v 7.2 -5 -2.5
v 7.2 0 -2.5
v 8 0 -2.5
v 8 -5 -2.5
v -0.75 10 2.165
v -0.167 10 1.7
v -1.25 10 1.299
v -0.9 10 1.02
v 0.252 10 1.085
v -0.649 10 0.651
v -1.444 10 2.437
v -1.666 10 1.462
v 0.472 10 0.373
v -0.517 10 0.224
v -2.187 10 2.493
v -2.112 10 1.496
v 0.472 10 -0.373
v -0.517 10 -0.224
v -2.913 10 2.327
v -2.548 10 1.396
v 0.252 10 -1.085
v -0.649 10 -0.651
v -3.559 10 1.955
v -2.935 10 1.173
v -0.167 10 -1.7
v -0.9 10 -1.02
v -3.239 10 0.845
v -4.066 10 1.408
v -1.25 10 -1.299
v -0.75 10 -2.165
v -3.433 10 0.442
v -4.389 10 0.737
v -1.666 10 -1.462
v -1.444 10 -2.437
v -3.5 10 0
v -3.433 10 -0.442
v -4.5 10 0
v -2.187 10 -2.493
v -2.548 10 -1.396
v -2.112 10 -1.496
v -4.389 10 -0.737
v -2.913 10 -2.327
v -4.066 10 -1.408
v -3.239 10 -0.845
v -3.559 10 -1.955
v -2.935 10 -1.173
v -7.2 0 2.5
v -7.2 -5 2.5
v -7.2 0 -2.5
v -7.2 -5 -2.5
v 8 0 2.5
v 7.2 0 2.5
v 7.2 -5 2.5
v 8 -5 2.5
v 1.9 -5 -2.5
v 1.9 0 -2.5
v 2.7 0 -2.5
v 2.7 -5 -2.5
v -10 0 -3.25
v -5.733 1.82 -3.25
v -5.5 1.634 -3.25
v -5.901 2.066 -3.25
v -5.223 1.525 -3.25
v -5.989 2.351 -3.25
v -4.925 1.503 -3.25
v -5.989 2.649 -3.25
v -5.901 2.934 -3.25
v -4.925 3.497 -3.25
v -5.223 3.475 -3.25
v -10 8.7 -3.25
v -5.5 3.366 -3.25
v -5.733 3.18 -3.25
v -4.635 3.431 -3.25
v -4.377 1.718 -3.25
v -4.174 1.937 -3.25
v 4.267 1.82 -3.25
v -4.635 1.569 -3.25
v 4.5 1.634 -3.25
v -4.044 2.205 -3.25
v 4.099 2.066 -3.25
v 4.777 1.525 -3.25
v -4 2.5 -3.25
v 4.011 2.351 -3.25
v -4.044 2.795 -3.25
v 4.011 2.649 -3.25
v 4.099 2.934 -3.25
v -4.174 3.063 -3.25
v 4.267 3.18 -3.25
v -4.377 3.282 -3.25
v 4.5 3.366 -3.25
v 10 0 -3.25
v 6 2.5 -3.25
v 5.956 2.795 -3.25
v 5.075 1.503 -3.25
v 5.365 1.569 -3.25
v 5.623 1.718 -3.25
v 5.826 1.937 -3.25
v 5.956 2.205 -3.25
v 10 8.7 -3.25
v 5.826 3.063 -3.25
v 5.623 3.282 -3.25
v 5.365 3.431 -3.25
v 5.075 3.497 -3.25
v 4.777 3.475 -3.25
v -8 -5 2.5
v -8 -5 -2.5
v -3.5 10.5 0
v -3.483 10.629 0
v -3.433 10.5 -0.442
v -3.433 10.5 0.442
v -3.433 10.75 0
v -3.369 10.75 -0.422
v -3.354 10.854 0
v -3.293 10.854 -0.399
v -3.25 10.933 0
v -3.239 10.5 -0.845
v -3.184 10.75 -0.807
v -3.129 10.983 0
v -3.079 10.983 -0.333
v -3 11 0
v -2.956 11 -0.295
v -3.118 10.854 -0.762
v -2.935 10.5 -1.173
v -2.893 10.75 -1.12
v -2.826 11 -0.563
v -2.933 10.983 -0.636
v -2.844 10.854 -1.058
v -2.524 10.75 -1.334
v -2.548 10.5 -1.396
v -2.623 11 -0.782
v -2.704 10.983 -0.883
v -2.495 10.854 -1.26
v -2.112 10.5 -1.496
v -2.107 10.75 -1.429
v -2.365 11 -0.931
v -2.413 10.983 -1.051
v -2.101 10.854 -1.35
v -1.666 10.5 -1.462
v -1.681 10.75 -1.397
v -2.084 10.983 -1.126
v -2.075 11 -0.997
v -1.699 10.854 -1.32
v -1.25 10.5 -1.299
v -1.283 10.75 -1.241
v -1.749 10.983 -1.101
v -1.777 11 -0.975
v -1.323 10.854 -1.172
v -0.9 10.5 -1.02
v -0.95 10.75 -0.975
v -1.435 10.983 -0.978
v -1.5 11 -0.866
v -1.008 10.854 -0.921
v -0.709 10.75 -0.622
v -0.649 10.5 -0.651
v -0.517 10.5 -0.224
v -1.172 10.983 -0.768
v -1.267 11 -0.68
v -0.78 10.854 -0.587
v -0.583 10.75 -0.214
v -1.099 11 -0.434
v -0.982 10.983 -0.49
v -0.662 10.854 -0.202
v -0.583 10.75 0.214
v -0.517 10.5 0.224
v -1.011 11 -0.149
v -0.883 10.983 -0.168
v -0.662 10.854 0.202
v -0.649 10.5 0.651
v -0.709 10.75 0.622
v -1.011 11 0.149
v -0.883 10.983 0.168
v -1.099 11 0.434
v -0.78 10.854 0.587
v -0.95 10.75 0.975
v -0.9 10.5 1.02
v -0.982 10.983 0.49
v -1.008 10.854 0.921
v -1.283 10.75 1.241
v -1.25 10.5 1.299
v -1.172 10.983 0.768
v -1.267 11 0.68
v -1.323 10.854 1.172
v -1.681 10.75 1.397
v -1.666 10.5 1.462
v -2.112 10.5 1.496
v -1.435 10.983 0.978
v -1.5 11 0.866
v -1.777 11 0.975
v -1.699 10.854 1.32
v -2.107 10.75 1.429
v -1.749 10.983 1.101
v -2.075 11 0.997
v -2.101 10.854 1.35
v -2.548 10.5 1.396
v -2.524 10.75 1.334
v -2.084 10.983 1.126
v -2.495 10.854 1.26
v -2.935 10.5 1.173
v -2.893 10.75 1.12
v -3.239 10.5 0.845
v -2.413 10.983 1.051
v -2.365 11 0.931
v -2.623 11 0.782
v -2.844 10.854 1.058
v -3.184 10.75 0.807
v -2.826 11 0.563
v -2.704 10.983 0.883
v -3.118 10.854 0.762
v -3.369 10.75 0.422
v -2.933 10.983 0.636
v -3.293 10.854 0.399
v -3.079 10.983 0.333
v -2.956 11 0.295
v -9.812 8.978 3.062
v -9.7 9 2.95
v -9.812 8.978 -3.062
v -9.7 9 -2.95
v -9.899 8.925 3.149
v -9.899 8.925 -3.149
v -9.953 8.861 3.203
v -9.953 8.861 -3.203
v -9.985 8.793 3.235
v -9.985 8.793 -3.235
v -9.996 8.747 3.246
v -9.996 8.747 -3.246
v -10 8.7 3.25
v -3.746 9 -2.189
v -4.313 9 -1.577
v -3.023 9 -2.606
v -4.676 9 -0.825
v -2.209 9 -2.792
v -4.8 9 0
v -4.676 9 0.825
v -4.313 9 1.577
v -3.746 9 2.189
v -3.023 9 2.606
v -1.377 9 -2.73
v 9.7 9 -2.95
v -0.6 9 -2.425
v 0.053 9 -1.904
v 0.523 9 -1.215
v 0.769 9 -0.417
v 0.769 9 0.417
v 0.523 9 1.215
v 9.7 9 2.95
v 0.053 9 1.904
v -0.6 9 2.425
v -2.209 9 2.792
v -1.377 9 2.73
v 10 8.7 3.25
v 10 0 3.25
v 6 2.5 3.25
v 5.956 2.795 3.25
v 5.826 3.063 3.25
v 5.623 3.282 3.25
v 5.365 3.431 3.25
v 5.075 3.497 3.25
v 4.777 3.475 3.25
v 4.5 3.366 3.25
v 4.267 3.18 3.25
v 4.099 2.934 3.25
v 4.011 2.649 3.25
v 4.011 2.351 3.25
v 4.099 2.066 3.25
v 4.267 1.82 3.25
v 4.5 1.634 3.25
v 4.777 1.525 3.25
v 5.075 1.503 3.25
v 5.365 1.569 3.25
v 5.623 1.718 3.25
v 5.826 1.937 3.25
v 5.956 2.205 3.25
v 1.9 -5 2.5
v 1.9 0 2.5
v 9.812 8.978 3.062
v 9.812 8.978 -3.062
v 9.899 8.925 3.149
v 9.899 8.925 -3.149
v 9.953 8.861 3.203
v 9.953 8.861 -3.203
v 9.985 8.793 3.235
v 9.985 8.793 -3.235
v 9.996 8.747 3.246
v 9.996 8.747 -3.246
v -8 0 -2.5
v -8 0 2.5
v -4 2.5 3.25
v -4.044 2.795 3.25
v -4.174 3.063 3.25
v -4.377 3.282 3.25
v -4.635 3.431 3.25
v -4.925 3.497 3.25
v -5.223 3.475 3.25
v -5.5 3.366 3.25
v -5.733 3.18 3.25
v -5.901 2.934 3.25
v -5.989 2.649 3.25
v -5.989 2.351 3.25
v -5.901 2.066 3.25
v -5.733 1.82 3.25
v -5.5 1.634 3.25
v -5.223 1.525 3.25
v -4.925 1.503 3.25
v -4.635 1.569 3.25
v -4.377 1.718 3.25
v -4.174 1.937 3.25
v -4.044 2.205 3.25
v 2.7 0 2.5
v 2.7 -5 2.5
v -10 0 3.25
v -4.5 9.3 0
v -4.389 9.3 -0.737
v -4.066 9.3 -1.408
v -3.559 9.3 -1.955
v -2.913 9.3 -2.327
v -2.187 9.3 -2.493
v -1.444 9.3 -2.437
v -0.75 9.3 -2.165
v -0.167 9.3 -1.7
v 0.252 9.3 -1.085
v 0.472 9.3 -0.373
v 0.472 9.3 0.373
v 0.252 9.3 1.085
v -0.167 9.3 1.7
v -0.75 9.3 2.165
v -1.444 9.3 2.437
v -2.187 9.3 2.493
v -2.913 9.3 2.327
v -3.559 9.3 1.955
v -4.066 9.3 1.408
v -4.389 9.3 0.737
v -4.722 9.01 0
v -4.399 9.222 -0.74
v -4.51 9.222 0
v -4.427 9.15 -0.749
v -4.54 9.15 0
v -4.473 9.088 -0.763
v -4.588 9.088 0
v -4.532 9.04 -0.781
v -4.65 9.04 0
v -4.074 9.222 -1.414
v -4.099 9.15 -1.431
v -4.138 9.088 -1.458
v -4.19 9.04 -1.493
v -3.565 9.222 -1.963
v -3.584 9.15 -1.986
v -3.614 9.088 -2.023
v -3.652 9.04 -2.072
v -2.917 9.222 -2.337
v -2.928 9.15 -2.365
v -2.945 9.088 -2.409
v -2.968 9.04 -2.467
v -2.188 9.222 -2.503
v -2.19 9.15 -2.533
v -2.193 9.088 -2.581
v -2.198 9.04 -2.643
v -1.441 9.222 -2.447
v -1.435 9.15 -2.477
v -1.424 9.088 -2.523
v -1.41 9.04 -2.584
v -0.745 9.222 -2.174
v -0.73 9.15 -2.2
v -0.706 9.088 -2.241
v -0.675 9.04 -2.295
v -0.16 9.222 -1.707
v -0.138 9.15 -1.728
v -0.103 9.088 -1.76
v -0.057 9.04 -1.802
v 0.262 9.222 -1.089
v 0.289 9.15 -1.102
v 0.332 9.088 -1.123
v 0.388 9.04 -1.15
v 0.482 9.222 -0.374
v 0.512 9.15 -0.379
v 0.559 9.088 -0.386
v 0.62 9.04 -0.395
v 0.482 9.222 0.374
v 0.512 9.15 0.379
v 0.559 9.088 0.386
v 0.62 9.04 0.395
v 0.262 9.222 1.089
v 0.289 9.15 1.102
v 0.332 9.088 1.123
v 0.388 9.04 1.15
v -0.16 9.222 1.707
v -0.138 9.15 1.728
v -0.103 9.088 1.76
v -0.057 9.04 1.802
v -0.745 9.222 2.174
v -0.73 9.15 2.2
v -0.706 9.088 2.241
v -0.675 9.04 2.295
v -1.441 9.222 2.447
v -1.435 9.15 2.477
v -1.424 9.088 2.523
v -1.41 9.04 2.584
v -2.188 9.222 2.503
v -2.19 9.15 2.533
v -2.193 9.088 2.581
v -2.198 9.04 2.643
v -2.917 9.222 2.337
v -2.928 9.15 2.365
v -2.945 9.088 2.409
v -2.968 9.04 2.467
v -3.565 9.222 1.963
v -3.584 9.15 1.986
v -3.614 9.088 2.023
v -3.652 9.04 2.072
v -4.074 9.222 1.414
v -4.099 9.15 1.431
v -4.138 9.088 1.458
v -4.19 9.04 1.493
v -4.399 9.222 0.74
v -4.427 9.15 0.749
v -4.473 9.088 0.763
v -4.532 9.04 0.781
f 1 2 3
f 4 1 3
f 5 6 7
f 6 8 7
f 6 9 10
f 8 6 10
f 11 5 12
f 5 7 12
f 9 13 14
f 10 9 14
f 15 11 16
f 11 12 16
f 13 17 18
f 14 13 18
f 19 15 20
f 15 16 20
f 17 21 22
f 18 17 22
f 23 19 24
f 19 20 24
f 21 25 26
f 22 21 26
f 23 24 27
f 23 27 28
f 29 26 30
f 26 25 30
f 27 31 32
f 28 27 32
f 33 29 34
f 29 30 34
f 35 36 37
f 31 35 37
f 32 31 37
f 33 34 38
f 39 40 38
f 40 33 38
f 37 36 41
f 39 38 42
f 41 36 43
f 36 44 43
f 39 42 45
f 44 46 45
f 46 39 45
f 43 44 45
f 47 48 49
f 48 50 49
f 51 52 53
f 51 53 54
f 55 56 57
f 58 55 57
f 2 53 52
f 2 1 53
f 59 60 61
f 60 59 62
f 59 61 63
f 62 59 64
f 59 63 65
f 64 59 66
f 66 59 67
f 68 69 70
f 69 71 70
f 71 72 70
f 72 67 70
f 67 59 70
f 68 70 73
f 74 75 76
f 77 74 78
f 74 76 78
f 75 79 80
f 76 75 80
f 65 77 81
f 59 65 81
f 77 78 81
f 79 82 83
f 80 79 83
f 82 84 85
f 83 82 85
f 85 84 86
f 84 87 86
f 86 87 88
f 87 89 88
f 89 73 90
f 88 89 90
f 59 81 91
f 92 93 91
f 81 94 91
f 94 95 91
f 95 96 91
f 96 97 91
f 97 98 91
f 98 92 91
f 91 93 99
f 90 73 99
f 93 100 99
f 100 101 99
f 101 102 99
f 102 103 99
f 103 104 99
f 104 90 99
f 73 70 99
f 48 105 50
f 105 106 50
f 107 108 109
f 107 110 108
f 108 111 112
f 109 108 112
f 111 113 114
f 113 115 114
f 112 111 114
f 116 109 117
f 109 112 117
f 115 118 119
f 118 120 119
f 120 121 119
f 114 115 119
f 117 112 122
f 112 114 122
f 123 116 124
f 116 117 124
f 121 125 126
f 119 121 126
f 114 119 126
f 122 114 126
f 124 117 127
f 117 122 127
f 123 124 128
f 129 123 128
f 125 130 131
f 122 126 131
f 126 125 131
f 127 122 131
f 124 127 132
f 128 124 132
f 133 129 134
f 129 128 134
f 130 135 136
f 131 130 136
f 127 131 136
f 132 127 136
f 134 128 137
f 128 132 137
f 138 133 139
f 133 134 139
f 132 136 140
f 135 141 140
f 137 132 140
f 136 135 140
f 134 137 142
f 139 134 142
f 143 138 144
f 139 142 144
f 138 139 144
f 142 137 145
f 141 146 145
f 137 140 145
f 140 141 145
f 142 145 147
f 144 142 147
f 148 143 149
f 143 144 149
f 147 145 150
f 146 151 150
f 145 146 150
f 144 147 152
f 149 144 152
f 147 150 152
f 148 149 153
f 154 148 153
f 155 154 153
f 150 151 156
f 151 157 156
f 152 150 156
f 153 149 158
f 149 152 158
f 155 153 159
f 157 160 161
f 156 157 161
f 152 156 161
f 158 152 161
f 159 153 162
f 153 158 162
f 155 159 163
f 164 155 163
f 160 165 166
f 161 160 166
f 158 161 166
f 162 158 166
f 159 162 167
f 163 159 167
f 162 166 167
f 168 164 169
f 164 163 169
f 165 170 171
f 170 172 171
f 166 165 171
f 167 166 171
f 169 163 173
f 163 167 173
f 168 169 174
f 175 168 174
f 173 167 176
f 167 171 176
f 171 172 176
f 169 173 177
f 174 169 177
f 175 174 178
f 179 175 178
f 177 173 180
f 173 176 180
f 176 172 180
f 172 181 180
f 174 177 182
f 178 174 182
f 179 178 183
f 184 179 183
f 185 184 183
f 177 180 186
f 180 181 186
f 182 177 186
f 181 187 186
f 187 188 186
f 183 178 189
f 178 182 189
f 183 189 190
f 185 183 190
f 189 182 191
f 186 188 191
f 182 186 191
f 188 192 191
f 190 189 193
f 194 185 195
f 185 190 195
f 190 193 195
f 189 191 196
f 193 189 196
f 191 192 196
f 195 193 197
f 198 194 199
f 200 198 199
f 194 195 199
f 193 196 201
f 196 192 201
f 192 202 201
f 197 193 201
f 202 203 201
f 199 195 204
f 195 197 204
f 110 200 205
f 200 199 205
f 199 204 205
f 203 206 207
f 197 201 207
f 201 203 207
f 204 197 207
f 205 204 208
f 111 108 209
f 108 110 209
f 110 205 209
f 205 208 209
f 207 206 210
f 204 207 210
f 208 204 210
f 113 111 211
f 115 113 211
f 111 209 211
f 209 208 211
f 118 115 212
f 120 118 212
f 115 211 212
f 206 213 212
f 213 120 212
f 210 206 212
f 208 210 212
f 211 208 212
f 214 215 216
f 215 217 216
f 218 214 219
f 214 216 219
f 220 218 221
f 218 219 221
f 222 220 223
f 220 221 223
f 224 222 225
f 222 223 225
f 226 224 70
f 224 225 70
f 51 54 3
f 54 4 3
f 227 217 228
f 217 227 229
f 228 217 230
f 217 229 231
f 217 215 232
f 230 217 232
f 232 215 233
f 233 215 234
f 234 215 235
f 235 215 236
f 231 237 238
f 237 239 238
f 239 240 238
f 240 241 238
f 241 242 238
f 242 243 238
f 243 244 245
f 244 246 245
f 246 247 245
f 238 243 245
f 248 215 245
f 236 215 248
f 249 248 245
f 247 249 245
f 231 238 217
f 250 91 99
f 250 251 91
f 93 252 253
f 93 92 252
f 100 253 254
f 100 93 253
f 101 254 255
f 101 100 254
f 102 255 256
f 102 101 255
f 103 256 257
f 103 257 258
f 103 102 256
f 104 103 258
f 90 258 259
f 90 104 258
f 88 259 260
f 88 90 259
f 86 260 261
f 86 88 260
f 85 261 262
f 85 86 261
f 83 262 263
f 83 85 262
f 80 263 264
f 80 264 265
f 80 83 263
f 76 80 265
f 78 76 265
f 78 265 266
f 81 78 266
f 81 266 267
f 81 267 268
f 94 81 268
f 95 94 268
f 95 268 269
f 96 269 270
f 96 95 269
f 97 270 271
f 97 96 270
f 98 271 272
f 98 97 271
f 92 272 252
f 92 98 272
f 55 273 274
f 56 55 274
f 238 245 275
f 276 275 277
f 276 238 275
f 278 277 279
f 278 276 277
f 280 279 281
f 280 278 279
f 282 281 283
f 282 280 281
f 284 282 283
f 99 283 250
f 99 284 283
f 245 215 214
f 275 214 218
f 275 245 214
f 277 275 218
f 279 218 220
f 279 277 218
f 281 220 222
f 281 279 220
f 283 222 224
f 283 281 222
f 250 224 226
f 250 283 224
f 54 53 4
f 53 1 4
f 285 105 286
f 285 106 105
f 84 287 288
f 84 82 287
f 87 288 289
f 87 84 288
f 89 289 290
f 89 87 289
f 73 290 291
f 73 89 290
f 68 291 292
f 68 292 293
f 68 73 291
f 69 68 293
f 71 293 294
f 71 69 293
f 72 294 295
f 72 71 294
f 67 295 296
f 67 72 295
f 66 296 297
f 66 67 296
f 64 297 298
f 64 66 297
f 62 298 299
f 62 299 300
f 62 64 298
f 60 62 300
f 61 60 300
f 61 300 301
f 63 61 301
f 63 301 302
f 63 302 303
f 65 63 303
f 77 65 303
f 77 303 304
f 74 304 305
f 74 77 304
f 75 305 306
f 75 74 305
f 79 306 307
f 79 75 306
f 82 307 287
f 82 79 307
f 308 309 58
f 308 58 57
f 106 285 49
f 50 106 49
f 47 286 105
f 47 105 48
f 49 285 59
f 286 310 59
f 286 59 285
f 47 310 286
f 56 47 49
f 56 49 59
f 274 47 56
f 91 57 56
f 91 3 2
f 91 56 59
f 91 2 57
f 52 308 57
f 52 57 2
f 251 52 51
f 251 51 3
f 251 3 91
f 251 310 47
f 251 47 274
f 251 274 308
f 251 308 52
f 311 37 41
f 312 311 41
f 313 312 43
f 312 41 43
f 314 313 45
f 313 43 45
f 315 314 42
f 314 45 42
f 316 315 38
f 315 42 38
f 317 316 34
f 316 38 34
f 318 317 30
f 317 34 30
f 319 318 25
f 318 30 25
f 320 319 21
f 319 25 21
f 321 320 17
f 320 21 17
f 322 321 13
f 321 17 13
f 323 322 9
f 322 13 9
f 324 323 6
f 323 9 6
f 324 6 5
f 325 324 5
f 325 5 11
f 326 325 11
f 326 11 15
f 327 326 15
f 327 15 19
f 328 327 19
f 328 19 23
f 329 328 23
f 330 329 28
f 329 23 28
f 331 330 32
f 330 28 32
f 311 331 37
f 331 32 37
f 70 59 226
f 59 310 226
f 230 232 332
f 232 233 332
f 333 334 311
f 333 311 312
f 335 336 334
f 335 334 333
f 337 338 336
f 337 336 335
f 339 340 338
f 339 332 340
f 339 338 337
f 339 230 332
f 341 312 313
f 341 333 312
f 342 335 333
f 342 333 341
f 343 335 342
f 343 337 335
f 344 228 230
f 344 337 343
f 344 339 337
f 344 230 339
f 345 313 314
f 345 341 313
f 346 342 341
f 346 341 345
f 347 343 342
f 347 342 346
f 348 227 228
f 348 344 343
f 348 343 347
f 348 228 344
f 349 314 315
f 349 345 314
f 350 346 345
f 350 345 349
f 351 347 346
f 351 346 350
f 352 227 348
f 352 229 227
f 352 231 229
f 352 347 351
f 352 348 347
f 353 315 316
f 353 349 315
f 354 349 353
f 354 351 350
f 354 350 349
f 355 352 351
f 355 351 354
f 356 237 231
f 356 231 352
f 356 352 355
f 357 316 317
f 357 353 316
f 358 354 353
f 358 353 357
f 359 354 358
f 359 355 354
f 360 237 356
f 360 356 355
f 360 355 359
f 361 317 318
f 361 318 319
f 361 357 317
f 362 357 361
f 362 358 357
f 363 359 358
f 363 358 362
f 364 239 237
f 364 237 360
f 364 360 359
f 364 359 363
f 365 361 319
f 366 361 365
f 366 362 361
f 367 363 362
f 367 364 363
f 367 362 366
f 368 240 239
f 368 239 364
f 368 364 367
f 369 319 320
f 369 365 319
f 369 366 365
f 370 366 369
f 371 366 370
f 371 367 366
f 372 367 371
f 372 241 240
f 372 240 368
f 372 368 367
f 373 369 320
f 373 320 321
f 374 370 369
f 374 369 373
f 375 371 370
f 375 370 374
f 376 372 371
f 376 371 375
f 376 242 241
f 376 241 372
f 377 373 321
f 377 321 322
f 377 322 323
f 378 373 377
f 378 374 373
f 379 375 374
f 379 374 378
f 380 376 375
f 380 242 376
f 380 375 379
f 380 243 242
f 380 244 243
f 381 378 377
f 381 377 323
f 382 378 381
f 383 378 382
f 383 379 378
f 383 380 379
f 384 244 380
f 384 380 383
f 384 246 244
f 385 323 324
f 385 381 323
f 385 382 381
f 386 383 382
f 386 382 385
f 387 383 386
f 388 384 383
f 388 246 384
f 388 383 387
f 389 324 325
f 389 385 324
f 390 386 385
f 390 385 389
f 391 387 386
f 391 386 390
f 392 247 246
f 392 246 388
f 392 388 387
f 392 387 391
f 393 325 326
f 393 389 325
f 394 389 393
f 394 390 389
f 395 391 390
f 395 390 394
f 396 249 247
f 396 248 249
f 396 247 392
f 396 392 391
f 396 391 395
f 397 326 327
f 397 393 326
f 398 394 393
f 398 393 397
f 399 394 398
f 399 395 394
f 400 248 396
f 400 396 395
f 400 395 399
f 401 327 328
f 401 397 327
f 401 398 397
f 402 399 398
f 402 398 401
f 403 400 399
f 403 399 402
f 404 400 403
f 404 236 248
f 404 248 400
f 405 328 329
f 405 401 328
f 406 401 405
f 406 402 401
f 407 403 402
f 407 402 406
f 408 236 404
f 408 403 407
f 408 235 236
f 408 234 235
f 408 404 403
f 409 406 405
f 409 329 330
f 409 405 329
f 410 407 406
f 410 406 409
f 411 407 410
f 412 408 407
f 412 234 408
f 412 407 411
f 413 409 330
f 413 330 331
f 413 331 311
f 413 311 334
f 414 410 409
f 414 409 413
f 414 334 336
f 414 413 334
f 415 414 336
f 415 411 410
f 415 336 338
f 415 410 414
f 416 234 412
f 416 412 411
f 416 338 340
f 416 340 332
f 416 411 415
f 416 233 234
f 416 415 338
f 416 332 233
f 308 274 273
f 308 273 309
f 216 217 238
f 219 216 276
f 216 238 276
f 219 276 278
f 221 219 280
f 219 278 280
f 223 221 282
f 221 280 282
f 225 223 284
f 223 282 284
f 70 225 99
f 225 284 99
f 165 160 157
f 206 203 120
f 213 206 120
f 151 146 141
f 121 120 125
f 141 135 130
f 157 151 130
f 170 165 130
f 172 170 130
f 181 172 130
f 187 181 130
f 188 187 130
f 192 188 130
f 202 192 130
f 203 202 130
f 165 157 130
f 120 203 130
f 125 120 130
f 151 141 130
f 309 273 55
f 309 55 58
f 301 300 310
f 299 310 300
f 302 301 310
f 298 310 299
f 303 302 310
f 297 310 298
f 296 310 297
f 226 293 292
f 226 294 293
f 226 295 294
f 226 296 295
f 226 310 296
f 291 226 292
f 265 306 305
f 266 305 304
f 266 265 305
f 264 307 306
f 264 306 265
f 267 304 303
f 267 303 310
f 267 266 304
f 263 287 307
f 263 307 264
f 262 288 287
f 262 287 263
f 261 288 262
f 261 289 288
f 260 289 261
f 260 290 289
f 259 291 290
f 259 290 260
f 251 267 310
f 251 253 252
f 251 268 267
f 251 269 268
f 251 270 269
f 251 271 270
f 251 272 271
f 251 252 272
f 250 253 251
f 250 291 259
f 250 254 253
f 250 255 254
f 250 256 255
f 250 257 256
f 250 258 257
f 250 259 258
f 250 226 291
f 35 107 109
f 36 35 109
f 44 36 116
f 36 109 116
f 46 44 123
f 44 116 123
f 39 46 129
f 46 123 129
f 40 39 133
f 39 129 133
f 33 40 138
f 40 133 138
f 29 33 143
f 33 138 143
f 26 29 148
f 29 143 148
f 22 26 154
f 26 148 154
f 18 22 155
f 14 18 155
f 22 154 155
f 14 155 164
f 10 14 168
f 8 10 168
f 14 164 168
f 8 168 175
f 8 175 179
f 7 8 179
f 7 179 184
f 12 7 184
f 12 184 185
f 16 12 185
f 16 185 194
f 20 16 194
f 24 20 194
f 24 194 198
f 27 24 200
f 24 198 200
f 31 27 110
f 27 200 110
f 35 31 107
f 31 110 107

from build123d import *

# Parameters (mm, degrees)
SKETCH_W     = 20
SKETCH_H     = 9
SKETCH_R     = 1
PAD_DEPTH    = 3.25
SKETCH001_W  = 0.8
SKETCH001_H  = 5
PAD001_DEPTH = 2.5
FILLET_R     = 0.5
FILLET001_R  = 0.3


with BuildPart() as part:
    # Sketch → Pad (new body, symmetric)
    with BuildSketch(Plane.XY):
        with Locations((0, 4.5)):
            Rectangle(SKETCH_W, SKETCH_H)
        with Locations((-5, 2.5)):
            Circle(SKETCH_R, mode=Mode.SUBTRACT)
        with Locations((5, 2.5)):
            Circle(SKETCH_R, mode=Mode.SUBTRACT)
    extrude(amount=PAD_DEPTH, both=True)

    # Sketch001 → Pad001 (join, symmetric)
    with BuildSketch(Plane.XY):
        with Locations((-7.6, -2.5)):
            Rectangle(SKETCH001_W, SKETCH001_H)
        with Locations((7.6, -2.5)):
            Rectangle(SKETCH001_W, SKETCH001_H)
        with Locations((2.3, -2.5)):
            Rectangle(SKETCH001_W, SKETCH001_H)
    extrude(amount=PAD001_DEPTH, both=True)

    # Sketch002 → Revolution (revolve)
    with BuildSketch(Plane.XY):
        Polygon((-2, 9), (-4.5, 9), (-4.5, 10), (-3.5, 10), (-3.5, 11), (-2, 11), align=None)
    revolve(axis=Axis((-2, 0, 0), (0, -1, 0)))

    # Fillet
    fillet_edges = [part.edges().sort_by_distance(p)[0] for p in [
        (-0.5, 11, 0),
    ]]
    fillet(fillet_edges, radius=FILLET_R)

    # Fillet001
    fillet001_edges = [part.edges().sort_by_distance(p)[0] for p in [
        (10, 9, 0),
        (0, 9, -3.25),
        (0, 9, 3.25),
        (-10, 9, 0),
        (0.5, 9, 0),
    ]]
    fillet(fillet001_edges, radius=FILLET001_R)


solid = part.part
